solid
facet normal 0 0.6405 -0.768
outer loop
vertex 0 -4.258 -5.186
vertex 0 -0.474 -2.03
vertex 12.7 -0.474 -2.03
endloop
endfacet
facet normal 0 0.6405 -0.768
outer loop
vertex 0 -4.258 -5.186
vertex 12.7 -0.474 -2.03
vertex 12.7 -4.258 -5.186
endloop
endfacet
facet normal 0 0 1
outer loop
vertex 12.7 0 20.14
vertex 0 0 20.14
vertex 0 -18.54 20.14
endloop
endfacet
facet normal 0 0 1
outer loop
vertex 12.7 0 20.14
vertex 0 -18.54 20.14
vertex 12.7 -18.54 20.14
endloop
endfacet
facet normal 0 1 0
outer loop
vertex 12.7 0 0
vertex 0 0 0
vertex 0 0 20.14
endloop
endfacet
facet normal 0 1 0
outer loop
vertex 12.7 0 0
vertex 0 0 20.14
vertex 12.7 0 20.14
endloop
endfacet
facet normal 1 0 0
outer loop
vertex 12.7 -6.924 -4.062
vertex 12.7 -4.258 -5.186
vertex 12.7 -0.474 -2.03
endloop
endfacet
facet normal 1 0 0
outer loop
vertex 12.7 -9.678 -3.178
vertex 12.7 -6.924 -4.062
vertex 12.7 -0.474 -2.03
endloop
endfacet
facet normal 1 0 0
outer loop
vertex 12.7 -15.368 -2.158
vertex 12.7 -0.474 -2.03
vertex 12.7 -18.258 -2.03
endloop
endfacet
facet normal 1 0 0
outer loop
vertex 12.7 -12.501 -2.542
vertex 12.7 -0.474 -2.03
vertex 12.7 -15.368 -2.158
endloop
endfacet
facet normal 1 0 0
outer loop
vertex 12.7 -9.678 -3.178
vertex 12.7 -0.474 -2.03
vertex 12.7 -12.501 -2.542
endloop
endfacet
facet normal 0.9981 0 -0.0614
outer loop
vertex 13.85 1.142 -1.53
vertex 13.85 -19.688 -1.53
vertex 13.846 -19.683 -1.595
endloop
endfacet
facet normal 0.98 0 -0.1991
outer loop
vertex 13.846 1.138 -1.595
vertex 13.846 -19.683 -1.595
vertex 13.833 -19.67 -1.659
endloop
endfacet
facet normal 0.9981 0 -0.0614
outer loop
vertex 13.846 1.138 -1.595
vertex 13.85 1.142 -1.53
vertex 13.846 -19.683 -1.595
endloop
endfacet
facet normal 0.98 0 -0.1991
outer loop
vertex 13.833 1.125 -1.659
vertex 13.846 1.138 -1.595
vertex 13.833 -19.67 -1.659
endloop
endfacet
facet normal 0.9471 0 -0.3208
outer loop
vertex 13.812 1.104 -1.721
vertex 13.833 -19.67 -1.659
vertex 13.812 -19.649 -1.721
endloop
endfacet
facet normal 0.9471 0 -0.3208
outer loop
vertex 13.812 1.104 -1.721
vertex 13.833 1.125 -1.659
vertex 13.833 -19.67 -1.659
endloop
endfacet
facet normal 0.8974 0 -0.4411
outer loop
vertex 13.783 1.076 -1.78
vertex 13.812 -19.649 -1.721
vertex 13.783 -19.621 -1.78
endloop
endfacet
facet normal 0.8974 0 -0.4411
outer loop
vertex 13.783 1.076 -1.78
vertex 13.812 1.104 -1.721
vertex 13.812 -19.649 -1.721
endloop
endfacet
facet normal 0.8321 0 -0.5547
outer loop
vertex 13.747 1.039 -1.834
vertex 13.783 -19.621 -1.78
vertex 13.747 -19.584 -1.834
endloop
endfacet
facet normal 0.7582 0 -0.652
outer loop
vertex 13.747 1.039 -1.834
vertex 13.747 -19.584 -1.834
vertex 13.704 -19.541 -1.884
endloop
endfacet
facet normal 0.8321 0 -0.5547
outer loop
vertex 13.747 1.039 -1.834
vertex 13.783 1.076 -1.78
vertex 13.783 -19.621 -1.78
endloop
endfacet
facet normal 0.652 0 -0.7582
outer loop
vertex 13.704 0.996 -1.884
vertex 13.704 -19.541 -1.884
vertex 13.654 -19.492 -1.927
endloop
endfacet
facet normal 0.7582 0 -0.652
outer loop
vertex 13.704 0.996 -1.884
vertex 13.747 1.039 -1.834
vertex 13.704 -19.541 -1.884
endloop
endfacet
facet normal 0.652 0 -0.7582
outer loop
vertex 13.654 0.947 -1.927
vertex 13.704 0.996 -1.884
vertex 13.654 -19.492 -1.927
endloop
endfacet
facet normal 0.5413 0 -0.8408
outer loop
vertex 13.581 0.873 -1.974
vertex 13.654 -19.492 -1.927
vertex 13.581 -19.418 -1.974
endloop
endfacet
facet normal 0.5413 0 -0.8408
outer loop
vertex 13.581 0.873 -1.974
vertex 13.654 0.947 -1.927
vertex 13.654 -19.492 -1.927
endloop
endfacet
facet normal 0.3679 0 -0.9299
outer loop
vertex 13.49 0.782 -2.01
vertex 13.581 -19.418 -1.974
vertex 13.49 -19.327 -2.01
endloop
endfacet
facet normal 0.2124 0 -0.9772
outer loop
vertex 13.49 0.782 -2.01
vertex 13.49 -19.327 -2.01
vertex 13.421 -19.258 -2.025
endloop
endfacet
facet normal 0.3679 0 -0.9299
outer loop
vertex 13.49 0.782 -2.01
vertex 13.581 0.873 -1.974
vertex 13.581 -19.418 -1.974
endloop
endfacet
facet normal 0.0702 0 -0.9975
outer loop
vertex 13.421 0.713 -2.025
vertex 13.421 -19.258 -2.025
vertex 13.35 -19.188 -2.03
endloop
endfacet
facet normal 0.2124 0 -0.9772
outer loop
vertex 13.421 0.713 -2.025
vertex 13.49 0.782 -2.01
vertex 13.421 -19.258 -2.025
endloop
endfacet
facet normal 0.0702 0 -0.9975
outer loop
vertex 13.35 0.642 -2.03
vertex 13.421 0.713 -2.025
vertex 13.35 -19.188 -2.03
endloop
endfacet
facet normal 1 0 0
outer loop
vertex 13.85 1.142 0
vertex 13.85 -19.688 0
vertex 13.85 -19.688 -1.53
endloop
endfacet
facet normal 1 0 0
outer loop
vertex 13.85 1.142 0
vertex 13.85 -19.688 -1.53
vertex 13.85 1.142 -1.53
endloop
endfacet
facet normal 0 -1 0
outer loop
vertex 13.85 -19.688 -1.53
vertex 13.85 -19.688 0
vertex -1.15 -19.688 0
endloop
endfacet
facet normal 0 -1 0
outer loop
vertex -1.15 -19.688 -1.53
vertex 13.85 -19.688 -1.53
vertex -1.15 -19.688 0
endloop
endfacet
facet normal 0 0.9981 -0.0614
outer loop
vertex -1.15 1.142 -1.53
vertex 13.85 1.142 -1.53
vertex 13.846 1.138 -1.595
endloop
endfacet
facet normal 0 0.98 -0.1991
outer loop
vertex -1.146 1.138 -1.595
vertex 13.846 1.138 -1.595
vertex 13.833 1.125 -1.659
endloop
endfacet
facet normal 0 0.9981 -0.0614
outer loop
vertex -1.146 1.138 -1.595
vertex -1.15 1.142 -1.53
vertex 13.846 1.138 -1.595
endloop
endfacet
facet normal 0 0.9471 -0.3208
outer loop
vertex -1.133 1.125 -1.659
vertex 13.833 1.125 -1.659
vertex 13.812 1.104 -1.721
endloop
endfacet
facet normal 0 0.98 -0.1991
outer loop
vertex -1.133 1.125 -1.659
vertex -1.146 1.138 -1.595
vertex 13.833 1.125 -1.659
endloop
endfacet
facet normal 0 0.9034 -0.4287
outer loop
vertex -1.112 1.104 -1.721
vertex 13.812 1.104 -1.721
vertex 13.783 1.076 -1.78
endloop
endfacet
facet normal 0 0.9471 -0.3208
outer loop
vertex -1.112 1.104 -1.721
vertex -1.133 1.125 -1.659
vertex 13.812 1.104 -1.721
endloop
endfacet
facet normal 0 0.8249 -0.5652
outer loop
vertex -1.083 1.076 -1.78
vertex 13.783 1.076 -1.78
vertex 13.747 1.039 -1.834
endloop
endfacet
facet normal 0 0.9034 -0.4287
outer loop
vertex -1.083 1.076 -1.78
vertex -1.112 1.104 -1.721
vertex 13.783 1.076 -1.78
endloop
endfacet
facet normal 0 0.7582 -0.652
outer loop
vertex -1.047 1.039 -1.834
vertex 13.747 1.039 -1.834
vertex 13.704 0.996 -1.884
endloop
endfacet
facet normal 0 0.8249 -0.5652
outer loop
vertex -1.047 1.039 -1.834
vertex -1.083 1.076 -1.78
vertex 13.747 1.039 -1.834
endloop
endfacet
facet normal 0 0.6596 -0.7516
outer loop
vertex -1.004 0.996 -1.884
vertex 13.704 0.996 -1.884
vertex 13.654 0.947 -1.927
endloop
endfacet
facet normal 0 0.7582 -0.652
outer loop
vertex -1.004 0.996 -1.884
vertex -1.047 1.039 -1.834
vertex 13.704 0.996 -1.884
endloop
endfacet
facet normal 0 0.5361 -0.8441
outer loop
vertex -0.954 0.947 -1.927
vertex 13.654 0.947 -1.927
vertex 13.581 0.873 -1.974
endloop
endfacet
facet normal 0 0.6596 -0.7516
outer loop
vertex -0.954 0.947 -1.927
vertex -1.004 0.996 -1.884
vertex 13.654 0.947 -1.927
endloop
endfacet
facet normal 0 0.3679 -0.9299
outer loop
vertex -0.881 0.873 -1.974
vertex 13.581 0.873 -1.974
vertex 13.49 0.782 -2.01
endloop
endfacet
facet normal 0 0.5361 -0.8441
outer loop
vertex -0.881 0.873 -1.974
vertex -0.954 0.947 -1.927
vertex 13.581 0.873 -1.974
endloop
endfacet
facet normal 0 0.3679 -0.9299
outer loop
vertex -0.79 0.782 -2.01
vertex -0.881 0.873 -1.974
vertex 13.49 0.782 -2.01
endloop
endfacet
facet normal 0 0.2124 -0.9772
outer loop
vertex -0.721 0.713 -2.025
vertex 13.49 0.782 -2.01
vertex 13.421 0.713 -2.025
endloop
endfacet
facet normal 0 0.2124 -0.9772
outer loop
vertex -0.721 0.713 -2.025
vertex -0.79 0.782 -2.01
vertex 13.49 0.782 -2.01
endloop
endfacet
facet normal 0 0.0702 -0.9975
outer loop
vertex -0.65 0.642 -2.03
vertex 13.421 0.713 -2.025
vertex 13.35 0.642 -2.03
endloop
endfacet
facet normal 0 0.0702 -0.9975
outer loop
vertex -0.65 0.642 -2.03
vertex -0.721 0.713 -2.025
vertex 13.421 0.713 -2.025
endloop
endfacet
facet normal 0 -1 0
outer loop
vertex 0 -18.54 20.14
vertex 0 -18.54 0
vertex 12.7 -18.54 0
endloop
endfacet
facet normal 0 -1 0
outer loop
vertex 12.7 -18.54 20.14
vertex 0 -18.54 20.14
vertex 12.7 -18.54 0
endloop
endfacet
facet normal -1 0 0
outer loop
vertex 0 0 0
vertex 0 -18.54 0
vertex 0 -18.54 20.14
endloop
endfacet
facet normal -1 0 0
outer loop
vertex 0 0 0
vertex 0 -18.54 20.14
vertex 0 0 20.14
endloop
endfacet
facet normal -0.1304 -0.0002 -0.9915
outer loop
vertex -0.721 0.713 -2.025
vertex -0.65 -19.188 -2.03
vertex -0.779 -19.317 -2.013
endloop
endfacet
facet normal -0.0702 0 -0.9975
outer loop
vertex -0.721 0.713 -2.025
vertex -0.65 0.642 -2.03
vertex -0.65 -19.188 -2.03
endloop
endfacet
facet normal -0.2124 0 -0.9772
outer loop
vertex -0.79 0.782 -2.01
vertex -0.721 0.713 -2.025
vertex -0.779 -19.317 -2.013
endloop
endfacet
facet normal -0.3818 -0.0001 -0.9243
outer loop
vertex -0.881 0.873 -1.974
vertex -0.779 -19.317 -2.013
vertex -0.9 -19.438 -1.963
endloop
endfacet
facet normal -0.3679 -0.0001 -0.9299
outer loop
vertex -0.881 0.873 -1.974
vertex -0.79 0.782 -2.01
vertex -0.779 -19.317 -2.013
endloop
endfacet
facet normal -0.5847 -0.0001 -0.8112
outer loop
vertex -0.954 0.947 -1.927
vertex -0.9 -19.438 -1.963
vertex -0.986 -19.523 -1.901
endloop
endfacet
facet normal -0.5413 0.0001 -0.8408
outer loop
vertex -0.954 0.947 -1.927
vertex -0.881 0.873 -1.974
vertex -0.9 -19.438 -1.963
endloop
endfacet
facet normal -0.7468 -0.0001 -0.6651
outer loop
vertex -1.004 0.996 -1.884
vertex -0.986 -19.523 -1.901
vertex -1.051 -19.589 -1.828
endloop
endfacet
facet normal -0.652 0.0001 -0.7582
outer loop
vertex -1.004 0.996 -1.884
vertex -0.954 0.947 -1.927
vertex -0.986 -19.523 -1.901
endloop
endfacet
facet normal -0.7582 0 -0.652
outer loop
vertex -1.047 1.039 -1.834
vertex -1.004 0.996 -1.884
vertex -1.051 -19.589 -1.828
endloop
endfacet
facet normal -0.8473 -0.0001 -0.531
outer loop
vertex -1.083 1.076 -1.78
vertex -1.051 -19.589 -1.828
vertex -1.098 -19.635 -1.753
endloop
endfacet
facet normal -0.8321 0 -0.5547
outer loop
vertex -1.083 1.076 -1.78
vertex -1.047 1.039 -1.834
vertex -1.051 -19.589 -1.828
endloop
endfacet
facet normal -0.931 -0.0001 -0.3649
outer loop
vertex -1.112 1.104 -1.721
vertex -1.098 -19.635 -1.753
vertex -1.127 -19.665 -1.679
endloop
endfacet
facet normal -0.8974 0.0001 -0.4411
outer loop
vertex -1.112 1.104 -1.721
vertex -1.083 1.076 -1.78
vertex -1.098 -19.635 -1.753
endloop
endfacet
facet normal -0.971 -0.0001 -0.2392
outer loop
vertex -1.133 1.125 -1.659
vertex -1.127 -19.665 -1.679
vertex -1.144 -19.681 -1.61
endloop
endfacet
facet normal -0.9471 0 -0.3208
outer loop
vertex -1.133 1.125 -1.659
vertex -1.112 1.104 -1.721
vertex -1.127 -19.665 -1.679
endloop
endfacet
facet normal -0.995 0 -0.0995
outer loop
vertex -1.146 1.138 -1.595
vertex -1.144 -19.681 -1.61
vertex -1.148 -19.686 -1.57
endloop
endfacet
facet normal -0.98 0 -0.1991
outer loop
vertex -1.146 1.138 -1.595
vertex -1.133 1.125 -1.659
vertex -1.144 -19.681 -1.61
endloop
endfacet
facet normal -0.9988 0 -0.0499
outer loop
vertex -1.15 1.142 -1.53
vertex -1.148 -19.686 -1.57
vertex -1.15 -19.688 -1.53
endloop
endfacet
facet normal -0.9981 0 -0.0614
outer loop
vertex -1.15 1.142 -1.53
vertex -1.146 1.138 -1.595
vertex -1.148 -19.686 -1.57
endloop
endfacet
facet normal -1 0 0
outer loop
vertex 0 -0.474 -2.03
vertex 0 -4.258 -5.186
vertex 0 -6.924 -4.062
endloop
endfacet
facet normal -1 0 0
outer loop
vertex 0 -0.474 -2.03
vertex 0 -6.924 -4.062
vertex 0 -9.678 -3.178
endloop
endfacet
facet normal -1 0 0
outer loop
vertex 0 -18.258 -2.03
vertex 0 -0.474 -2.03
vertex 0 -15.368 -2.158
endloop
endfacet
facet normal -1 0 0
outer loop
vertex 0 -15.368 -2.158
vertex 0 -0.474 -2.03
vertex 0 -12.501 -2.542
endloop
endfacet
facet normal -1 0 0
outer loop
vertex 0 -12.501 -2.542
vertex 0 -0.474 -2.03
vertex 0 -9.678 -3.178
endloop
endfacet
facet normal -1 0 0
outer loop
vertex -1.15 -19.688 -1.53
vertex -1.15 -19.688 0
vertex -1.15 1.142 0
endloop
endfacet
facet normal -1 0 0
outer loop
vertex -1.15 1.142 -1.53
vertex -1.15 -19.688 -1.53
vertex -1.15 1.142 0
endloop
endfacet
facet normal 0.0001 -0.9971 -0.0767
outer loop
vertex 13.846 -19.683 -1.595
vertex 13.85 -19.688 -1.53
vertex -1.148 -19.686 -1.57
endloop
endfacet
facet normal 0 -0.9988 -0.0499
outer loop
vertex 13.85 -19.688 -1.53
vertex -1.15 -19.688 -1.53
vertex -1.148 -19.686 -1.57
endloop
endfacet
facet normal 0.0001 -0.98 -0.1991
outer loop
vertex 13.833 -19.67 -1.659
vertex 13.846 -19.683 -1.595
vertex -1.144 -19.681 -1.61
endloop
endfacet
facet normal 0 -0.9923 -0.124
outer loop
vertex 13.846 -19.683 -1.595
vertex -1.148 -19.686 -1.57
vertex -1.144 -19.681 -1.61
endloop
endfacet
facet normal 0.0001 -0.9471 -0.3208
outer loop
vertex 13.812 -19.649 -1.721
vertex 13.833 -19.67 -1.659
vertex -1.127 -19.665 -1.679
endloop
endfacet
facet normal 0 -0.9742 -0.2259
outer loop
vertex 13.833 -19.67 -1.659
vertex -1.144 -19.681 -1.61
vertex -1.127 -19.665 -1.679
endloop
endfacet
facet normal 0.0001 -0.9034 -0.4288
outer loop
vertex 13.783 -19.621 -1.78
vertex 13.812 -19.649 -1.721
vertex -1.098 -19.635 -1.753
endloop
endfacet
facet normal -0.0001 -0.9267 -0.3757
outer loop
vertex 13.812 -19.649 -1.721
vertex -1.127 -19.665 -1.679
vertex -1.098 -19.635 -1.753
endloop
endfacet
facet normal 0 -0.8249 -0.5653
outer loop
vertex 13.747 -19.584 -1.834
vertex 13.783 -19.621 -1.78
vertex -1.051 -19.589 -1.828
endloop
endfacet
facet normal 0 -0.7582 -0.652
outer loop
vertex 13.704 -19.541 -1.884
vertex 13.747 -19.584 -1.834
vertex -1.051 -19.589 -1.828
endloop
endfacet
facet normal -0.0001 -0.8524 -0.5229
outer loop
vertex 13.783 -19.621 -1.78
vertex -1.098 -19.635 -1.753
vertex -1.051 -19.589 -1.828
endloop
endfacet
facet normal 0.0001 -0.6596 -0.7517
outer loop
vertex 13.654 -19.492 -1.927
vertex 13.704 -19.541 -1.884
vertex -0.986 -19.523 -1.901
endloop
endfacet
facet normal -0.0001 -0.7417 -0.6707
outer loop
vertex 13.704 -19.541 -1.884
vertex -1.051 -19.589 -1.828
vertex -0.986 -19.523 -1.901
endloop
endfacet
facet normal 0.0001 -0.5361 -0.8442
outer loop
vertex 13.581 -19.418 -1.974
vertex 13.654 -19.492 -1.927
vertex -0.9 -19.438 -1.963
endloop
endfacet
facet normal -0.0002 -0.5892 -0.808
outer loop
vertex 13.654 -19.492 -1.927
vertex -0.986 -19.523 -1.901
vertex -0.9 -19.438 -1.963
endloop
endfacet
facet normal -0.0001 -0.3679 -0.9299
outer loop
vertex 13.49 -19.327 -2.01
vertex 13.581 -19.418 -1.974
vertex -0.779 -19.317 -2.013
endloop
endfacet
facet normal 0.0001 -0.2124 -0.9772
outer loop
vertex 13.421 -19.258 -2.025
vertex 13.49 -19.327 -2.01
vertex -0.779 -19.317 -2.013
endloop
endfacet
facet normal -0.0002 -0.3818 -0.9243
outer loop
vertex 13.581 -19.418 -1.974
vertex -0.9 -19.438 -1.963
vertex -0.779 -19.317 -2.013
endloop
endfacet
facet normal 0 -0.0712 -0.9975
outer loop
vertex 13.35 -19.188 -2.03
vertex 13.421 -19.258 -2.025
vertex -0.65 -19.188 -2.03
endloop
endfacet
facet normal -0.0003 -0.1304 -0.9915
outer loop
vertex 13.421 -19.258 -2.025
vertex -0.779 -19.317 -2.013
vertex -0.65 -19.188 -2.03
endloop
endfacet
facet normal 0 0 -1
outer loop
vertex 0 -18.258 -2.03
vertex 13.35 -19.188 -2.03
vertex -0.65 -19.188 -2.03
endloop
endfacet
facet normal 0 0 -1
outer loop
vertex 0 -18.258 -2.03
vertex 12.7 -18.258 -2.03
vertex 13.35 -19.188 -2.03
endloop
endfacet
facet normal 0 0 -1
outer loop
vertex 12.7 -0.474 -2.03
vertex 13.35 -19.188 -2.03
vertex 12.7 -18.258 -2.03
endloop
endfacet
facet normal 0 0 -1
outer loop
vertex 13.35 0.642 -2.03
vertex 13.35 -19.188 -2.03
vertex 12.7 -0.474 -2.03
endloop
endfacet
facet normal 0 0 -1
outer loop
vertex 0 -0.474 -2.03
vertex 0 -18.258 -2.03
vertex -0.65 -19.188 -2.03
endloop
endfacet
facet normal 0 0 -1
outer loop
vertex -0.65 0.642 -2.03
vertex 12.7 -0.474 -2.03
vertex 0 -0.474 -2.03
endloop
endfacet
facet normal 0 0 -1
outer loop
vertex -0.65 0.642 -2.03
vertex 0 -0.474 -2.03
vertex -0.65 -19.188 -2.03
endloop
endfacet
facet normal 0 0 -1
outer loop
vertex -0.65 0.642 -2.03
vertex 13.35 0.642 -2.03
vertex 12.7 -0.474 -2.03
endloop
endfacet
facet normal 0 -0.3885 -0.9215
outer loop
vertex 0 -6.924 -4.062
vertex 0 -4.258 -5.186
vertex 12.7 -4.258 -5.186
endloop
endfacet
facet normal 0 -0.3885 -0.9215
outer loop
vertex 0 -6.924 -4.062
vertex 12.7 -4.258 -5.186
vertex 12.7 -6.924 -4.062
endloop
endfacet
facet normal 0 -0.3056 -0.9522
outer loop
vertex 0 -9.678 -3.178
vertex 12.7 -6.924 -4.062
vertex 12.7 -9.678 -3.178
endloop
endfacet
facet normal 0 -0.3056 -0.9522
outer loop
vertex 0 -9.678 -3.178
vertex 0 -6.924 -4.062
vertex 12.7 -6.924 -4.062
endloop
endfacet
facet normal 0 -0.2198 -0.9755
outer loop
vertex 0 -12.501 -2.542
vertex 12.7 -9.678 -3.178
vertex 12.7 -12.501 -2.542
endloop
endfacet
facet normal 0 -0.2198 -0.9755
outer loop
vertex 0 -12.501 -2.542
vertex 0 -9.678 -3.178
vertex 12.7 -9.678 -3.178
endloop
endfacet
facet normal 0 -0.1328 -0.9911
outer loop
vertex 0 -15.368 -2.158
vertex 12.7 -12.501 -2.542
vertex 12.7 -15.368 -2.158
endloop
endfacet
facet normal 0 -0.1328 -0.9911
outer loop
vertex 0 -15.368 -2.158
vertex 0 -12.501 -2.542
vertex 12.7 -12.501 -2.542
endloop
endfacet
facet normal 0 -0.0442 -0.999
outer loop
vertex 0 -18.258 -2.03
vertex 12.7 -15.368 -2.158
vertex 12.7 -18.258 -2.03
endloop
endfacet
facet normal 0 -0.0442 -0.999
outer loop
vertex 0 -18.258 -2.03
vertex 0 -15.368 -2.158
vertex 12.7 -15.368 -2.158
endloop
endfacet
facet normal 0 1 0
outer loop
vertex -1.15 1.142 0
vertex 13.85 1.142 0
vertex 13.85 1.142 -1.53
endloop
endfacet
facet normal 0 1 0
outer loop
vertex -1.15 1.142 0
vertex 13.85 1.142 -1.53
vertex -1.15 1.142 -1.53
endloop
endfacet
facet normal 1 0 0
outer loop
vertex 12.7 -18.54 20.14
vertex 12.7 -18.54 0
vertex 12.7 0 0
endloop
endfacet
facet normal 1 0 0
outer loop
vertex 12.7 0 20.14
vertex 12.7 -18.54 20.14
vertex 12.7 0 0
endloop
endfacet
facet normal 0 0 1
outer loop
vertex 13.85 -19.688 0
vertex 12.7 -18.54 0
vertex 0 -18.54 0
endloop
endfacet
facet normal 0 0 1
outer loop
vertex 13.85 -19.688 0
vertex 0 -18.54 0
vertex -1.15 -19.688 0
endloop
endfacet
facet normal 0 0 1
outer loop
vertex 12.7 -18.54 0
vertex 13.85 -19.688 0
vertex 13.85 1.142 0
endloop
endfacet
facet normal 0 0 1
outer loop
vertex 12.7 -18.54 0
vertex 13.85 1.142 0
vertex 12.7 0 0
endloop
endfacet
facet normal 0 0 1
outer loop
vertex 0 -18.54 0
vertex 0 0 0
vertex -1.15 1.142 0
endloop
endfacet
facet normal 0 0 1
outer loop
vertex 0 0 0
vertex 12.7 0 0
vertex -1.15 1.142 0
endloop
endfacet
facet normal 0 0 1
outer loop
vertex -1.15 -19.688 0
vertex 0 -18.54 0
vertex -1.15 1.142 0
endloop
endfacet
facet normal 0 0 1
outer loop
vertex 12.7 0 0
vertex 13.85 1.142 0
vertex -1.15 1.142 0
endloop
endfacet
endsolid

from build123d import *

# Parameters (mm, degrees)
SKETCH1_W      = 12.7
SKETCH1_H      = 18.54
EXTRUDE1_DEPTH = 20.14
SKETCH2_W      = 15
SKETCH2_H      = 20.83
EXTRUDE2_DEPTH = 2.03
FILLET1_R      = 0.5
EXTRUDE3_DEPTH = 12.7


with BuildPart() as part:
    # Sketch1 → Extrude1 (new body)
    with BuildSketch(Plane.XY):
        with Locations((6.35, -9.27)):
            Rectangle(SKETCH1_W, SKETCH1_H)
    extrude(amount=EXTRUDE1_DEPTH)

    # Sketch2 → Extrude2 (add)
    with BuildSketch(Plane(origin=(0, 0, 0), x_dir=(-1, 0, 0), z_dir=(0, 0, -1))):
        with Locations((-6.35, -9.2725)):
            Rectangle(SKETCH2_W, SKETCH2_H)
    extrude(amount=EXTRUDE2_DEPTH)

    # Fillet1
    fillet1_edges = [part.edges().sort_by_distance(p)[0] for p in [
        (6.35, 1.1425, -2.03),
        (13.85, -9.2725, -2.03),
        (-1.15, -9.2725, -2.03),
        (6.35, -19.6875, -2.03),
    ]]
    fillet(fillet1_edges, radius=FILLET1_R)

    # Sketch3 → Extrude3 (add)
    with BuildSketch(Plane.ZY):
        with BuildLine():
            Line((-2.03, -18.257976245), (-2.03, -0.473719642))
            Line((-2.03, -0.473719642), (-5.186140292, -4.258209447))
            ThreePointArc((-5.186140292, -4.258209447), (-2.828813648, -11.082415432), (-2.03, -18.257976245))
        make_face()
    extrude(amount=-EXTRUDE3_DEPTH)


solid = part.part
